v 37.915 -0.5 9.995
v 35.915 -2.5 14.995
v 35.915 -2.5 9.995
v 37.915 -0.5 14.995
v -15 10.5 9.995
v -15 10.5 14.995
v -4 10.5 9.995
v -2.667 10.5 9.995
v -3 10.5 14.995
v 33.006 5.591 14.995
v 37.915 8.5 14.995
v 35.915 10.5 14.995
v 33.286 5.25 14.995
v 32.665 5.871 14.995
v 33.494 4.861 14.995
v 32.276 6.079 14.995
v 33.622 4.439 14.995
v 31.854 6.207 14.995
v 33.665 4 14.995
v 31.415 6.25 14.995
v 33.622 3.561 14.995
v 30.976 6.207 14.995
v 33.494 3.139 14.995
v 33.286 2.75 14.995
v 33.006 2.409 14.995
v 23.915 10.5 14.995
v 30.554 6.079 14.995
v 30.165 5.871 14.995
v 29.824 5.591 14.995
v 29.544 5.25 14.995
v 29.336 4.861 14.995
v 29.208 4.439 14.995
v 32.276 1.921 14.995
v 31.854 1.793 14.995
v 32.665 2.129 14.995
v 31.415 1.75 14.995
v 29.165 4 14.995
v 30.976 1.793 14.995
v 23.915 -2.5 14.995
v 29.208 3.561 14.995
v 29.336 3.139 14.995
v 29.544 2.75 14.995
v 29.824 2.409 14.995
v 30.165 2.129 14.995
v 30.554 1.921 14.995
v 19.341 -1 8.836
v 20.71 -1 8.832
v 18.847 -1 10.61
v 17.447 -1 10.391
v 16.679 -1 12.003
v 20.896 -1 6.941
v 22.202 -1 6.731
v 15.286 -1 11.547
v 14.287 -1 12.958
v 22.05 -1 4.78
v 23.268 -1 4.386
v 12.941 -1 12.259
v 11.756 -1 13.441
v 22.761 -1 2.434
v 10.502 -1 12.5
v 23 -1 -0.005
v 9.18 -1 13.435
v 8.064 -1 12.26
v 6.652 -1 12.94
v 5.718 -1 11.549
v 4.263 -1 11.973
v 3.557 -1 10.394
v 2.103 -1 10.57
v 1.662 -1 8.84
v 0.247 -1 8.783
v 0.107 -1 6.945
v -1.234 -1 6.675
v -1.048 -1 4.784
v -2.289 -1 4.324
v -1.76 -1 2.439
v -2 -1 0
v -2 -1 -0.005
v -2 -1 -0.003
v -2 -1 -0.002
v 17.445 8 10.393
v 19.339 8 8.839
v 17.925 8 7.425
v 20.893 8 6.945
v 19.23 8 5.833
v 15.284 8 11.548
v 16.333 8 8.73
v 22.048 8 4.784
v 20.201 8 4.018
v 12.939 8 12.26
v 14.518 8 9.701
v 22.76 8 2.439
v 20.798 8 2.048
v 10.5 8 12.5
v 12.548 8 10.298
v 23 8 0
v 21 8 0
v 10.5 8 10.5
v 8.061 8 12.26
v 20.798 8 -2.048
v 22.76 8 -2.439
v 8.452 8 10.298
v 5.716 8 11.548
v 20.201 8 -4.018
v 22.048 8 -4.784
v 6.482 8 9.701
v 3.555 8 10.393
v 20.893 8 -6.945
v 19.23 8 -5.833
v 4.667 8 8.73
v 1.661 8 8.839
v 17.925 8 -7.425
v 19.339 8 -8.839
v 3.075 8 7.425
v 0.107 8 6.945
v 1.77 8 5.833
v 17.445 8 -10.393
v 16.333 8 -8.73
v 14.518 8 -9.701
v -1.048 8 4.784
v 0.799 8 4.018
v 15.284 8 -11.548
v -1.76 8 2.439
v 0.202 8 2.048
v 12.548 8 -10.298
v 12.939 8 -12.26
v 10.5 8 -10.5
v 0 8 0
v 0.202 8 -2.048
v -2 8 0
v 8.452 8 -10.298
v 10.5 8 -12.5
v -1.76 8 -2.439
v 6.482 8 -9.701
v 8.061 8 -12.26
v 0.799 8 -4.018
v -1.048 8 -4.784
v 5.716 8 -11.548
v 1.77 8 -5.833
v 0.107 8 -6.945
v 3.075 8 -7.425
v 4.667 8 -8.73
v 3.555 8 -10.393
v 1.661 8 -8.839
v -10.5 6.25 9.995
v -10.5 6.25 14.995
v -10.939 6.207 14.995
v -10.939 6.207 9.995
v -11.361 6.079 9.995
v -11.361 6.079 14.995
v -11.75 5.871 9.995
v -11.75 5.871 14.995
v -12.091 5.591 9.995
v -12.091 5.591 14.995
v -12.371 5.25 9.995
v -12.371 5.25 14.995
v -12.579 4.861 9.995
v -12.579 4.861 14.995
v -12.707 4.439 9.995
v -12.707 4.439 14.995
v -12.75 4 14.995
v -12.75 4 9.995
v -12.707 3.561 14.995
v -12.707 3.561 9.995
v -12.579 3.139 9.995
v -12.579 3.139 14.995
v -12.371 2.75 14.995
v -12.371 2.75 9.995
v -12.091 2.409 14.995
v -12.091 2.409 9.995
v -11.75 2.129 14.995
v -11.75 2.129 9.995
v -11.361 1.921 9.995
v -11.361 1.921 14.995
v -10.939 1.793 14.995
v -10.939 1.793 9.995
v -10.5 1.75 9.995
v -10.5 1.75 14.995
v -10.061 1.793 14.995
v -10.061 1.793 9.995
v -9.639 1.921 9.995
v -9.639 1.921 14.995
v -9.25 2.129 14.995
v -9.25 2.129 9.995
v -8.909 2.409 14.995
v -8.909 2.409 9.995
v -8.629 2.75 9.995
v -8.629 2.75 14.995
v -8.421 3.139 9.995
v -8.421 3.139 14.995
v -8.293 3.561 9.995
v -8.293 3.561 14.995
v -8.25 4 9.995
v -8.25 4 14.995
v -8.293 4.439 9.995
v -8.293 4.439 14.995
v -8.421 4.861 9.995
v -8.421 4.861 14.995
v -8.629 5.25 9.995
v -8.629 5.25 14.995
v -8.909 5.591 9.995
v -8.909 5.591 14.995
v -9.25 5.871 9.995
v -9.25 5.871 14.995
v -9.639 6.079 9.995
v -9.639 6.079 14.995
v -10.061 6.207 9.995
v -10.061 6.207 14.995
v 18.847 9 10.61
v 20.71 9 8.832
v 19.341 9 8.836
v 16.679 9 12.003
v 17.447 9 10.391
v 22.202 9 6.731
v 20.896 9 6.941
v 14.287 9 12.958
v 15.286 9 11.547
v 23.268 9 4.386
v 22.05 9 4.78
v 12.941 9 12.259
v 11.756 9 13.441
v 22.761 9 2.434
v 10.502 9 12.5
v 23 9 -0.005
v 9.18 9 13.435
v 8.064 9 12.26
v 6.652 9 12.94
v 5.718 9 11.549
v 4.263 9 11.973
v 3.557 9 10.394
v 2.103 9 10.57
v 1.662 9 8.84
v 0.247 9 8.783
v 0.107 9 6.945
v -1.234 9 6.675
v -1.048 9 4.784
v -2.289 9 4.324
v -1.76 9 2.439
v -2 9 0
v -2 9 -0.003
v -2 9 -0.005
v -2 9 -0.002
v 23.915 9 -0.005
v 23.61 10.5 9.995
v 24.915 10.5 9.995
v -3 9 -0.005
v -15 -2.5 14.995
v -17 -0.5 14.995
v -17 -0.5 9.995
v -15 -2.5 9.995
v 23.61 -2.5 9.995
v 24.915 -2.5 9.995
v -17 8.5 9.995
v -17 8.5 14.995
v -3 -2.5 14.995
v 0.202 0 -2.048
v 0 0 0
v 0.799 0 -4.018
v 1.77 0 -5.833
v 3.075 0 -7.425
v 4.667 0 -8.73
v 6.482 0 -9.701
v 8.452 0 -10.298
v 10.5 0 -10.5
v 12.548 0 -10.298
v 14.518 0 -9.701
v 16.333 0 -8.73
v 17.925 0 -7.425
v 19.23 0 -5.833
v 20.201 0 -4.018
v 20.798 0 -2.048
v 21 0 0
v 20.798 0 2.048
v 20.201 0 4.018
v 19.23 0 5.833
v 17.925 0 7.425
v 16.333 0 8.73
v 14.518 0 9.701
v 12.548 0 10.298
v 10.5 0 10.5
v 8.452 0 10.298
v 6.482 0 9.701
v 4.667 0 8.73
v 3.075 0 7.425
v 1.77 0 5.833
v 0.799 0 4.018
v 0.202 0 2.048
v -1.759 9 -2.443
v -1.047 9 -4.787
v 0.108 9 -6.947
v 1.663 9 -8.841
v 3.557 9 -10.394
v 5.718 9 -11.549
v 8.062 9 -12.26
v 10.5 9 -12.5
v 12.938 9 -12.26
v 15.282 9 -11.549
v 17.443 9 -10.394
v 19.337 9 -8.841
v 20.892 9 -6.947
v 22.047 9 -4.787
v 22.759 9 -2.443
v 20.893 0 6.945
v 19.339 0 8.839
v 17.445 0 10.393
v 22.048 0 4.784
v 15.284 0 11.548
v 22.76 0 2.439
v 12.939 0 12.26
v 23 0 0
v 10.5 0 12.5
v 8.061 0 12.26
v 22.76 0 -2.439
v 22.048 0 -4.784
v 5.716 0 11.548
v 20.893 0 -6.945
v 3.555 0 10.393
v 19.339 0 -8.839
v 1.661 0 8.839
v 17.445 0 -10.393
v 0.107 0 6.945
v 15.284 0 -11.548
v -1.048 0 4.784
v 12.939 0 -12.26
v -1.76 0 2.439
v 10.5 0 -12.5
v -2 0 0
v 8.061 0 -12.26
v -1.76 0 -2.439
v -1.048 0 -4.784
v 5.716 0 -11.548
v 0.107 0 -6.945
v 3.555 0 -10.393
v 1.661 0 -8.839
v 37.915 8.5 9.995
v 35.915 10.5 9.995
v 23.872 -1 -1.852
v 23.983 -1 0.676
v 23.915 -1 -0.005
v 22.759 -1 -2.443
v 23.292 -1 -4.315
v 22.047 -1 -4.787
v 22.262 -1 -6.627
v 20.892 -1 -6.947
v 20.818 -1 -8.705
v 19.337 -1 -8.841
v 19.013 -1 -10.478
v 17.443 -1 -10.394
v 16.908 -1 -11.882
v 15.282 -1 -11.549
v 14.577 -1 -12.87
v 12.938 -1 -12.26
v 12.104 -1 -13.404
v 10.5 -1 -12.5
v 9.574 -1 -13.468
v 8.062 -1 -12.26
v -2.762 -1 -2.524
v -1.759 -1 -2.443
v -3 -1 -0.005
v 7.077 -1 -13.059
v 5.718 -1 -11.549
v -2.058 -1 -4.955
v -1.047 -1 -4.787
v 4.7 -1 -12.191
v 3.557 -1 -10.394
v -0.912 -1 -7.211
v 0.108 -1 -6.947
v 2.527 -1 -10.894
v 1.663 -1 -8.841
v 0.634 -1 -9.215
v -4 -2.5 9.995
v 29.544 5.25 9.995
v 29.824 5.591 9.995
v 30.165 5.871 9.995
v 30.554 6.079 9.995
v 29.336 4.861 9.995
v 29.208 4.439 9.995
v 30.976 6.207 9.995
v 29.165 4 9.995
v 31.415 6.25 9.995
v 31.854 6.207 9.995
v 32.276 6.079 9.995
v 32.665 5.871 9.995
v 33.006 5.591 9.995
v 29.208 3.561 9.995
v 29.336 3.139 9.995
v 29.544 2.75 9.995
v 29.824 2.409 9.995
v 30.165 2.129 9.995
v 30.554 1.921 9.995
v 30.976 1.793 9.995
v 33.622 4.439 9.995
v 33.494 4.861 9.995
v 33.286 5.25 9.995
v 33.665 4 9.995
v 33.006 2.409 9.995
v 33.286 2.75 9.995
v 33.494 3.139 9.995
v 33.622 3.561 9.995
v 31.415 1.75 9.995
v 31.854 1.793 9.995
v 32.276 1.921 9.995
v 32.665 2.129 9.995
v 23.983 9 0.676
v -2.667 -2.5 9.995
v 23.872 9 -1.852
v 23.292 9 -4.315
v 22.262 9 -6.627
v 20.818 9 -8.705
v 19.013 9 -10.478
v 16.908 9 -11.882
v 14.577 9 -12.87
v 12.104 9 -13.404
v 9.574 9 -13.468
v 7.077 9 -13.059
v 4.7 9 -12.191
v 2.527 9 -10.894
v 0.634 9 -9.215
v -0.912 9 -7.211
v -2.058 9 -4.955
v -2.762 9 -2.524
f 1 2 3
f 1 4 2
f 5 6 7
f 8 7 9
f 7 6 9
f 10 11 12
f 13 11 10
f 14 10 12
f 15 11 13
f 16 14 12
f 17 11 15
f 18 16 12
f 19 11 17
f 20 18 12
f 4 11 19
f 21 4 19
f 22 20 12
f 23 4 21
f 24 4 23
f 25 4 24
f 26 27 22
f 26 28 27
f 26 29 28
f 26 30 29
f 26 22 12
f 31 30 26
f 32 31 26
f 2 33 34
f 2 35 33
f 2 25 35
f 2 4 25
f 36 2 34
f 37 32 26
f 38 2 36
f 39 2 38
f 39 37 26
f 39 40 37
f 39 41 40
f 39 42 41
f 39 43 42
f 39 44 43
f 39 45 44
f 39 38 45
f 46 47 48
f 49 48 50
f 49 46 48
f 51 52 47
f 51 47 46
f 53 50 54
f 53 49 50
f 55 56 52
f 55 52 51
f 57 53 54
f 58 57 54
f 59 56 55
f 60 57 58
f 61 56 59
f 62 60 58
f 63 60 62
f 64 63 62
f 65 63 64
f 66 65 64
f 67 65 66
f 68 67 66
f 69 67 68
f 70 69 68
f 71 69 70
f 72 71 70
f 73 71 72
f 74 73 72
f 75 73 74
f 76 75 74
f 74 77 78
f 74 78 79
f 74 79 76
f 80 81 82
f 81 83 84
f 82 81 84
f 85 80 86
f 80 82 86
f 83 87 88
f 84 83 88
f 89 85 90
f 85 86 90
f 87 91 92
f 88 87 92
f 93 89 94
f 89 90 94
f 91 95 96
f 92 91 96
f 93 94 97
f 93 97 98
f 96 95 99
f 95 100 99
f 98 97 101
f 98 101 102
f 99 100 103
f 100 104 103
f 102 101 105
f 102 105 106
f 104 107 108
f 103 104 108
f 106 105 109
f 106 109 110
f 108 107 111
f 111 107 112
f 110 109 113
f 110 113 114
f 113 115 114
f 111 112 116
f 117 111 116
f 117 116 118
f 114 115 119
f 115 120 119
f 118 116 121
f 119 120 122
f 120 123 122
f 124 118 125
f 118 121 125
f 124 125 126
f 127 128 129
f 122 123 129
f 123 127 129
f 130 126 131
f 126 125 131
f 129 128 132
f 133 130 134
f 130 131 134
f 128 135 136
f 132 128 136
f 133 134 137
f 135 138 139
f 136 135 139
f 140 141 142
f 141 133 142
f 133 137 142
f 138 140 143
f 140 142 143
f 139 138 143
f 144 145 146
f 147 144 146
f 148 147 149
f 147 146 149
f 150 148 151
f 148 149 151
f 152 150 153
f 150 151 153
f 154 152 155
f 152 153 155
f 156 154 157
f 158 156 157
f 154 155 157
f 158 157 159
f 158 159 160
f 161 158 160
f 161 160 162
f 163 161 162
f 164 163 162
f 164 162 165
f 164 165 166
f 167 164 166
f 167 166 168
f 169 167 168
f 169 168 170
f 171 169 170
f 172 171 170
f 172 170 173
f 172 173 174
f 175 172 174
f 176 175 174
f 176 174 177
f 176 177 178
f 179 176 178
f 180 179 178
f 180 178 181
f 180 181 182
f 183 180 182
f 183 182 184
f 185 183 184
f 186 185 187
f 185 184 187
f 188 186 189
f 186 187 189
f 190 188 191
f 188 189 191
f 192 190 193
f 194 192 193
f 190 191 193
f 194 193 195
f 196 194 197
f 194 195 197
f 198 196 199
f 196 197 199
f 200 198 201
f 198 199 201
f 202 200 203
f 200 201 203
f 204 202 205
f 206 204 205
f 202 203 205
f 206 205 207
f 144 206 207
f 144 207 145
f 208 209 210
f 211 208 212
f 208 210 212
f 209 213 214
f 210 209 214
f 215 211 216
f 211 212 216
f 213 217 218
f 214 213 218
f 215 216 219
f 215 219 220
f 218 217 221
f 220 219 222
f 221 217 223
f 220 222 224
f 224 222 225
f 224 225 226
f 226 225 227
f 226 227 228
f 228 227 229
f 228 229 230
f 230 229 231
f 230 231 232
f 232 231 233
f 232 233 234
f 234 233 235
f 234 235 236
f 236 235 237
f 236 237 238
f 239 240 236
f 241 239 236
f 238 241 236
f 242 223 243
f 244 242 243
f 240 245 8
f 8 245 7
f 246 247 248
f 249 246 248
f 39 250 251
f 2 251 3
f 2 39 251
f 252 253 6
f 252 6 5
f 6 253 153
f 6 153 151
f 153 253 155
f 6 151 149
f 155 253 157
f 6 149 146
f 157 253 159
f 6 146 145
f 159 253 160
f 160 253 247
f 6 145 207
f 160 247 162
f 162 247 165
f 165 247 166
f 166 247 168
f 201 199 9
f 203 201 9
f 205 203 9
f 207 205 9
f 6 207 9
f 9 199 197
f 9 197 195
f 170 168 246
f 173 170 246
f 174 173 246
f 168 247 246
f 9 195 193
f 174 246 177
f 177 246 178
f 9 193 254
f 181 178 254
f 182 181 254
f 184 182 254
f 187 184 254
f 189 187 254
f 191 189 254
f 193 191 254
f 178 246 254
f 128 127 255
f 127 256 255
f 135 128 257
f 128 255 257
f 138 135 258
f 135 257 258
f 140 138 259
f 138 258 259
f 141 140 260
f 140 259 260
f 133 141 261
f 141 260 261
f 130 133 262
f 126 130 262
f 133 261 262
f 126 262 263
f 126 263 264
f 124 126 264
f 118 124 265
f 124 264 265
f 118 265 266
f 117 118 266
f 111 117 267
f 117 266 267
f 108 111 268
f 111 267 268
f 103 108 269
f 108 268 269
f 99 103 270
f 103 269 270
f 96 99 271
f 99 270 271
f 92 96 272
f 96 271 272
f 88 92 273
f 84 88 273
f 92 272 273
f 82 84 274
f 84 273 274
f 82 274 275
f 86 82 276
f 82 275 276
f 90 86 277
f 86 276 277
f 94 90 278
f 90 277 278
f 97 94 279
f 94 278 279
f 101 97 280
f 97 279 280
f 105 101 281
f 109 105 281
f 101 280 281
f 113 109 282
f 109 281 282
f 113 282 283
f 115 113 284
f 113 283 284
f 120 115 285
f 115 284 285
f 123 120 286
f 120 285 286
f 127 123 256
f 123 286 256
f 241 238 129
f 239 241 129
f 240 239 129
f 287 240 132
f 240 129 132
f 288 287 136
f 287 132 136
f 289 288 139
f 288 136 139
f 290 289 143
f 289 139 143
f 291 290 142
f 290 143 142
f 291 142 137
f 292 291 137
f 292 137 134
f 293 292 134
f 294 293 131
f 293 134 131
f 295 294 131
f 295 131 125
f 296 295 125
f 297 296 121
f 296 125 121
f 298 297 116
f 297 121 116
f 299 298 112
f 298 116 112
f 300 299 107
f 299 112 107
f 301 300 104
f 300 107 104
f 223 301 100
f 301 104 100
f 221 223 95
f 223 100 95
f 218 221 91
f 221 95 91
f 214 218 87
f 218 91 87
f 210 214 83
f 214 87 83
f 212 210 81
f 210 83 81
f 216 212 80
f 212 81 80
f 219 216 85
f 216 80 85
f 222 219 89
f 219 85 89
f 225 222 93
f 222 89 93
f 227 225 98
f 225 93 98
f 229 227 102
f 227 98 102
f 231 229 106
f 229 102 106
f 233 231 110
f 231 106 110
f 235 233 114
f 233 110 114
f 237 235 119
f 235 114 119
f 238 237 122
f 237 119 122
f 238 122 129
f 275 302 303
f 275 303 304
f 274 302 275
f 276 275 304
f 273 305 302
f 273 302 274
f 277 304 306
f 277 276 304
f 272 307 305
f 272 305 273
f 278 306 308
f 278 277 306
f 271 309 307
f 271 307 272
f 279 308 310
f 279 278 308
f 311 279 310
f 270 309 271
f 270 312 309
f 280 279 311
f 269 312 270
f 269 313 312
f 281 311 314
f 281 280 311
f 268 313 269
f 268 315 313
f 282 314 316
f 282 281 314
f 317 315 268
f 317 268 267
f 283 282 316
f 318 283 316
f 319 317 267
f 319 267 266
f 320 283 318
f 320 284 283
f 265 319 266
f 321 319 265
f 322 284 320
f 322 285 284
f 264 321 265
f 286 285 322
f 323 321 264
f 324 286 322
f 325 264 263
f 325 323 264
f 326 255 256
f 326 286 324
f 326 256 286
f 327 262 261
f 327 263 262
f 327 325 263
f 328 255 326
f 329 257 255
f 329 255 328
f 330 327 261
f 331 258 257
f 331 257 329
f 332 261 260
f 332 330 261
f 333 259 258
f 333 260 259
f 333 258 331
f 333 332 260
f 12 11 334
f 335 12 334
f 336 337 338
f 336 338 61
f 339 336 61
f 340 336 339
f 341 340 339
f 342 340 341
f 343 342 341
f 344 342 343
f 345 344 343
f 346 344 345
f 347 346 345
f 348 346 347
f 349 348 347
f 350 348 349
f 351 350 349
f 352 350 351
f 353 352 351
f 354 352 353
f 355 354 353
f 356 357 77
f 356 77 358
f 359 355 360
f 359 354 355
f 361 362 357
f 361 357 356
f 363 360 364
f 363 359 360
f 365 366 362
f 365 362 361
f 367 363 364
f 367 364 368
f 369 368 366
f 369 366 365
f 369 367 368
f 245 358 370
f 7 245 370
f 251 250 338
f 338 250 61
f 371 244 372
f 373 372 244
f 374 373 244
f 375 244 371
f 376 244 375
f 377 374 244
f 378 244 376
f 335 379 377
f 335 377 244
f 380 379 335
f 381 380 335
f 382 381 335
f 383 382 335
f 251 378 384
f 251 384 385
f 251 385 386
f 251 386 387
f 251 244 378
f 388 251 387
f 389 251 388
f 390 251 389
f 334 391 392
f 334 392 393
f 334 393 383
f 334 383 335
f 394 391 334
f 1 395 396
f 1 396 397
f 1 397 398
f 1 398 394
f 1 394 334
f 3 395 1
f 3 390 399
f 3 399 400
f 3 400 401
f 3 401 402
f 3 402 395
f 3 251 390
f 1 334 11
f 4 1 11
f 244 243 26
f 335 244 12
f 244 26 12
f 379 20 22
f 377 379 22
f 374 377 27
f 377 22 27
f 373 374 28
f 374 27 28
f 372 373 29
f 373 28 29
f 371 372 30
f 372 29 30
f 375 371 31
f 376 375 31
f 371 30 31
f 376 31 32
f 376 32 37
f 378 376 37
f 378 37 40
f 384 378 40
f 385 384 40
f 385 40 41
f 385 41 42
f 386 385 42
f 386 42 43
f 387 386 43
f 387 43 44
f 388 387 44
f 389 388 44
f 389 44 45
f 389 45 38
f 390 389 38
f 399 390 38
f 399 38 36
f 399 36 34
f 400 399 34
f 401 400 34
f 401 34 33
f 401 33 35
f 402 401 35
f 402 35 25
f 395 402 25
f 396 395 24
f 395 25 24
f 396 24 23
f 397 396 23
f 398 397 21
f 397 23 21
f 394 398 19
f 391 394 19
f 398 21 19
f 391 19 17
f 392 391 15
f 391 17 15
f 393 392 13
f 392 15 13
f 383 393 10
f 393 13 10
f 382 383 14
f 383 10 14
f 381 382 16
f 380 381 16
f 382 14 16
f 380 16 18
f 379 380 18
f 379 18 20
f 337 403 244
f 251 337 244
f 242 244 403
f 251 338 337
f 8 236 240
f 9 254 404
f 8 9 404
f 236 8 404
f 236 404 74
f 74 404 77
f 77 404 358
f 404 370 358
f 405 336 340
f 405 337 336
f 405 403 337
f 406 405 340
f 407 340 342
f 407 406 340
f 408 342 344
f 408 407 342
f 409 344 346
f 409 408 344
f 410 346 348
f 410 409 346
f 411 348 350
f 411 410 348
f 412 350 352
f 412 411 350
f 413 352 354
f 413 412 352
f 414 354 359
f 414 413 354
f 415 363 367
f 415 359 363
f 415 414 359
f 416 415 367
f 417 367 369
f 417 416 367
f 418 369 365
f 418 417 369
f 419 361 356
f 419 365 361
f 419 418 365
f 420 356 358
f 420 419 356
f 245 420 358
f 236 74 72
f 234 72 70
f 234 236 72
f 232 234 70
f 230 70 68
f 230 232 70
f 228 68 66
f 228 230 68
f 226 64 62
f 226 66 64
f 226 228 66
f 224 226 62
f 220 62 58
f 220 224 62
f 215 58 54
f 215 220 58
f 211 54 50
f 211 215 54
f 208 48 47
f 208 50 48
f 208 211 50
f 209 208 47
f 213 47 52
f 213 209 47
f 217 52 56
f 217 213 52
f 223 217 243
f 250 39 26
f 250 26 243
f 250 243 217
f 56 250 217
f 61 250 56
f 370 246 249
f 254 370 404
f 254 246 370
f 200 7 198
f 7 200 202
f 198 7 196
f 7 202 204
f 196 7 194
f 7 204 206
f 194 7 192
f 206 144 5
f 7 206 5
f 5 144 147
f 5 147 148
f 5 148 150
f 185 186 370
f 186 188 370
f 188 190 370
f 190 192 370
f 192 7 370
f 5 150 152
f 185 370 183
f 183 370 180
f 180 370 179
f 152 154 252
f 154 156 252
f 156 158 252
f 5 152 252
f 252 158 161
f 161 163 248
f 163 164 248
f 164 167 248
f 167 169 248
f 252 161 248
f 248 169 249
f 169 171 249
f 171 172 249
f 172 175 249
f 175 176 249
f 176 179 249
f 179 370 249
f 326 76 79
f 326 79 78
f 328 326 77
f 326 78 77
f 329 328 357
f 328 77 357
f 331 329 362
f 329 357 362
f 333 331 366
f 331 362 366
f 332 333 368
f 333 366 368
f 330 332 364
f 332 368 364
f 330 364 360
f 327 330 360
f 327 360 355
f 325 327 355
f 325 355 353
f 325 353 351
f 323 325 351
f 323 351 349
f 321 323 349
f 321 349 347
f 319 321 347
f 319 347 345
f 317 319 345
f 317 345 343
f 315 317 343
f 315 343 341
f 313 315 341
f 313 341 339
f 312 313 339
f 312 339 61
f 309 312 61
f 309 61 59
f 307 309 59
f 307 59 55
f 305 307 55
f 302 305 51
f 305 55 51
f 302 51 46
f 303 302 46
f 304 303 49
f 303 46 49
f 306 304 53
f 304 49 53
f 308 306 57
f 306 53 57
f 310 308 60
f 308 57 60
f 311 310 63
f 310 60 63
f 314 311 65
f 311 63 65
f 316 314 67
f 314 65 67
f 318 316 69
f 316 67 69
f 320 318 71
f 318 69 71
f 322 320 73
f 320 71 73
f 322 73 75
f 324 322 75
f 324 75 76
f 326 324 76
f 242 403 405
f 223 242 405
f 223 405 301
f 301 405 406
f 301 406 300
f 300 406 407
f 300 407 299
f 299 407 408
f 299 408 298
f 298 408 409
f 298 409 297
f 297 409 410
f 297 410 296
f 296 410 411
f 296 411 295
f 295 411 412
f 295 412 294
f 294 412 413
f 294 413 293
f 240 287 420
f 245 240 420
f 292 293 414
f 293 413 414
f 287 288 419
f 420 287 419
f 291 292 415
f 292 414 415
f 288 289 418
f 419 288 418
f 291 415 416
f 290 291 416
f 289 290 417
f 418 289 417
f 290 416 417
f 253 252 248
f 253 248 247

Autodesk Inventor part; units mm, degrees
ref_plane "YZ Plane" through (0, 0, 0) normal (1, 0, 0) x (0, 1, 0)
ref_plane "XZ Plane" through (0, 0, 0) normal (0, 1, 0) x (-1, 0, 0)
ref_plane "XY Plane" through (0, 0, 0) normal (0, 0, 1) x (1, 0, 0)
sketch "Skizze1" plane through (0, 0, 0) normal (0, 0, 1) x (1, 0, 0)
  line L0 (0, 0) -> (-2, 0)
  line L1 (-2, 0) -> (-2, -1)
  line L2 (-2, -1) -> (-3, -1)
  line L3 (-3, -1) -> (-3, 9)
  line L4 (-3, 9) -> (-2, 9)
  line L5 (-2, 9) -> (-2, 8)
  line L6 (-2, 8) -> (0, 8)
  line L7 (0, 8) -> (0, 0)
  line L8 (10.5, 10.652115) -> (10.5, -3.008314) construction
  dimension "d0" = 3
  dimension "d1" = 10
  dimension "d2" = 8
  dimension "d3" = 1
  dimension "d4" = 2
  dimension "d5" = 10.5
sketch "Skizze1 outline for Umdrehung1" plane through (0, 0, 0) normal (0, 0, 1) x (1, 0, 0)
  line L0 (0, 0) -> (-2, 0)
  line L1 (-2, 0) -> (-2, -1)
  line L2 (-2, -1) -> (-3, -1)
  line L3 (-3, -1) -> (-3, 9)
  line L4 (-3, 9) -> (-2, 9)
  line L5 (-2, 9) -> (-2, 8)
  line L6 (-2, 8) -> (0, 8)
  line L7 (0, 8) -> (0, 0)
revolve "Umdrehung1" add sketch "Skizze1 outline for Umdrehung1" angle 360 about axis through (10.5, 10.652115, 0) along (0, -1, 0)
sketch "Skizze2" plane through (10.5, -1, 0) normal (0, -1, 0) x (1, 0, 0)
  circle A0 centre (0, 0) radius 13.5 construction
  line L0 (-13.499999, -0.004969) -> (1.488599, -0.004969) construction
  line L1 (-13.5, 14.995031) -> (-27.5, 14.995031)
  line L2 (-27.5, 14.995031) -> (-27.5, 9.995031)
  circle A1 centre (0, 0) radius 12.5 construction
  circle A2 centre (0, 0) radius 13.5
  circle A3 centre (0, 0) radius 12.5
  circle A4 centre (0, 0) radius 12.5
  line L3 (-27.5, 9.995031) -> (-14.5, 9.995031)
  line L4 (-14.5, 9.995031) -> (-13.499999, -0.004969)
  line L5 (-0.042524, -33.95519) -> (-0.042524, 19.973998) construction
  line L6 (13.414952, 14.995031) -> (27.414952, 14.995031)
  line L7 (27.414952, 14.995031) -> (27.414952, 9.995031)
  line L8 (12.499991, -0.004969) -> (13.414952, 14.995031)
  line L9 (27.414952, 9.995031) -> (14.414952, 9.995031)
  line L10 (14.414952, 9.995031) -> (13.414951, -0.004969)
  line L11 (-13.5, 14.995031) -> (-12.499999, -0.004969)
  circle A5 centre (0, 0) radius 12.5
  line L12 (-12.499999, -0.004969) -> (-13.499999, -0.004969)
  line L13 (13.414951, -0.004969) -> (12.499991, -0.004969)
  point P0 (-10.5, 0)
  point P1 (10.414952, 0)
  dimension "d9" = 15
  dimension "d11" = 5
  dimension "d12" = 13
  dimension "d13" = 14
  dimension "d14" = 27.5
sketch "Skizze2 outline for Extrusion1" plane through (10.5, -1, 0) normal (0, -1, 0) x (1, 0, 0)
  line L0 (12.499991, -0.004969) -> (13.414951, -0.004969)
  line L1 (13.414952, 14.995031) -> (12.499991, -0.004969)
  line L2 (27.414952, 14.995031) -> (13.414952, 14.995031)
  line L3 (27.414952, 9.995031) -> (27.414952, 14.995031)
  line L4 (14.414952, 9.995031) -> (27.414952, 9.995031)
  line L5 (13.414951, -0.004969) -> (14.414952, 9.995031)
  line L6 (-13.499999, -0.004969) -> (-14.5, 9.995031)
  line L7 (-14.5, 9.995031) -> (-27.5, 9.995031)
  line L8 (-27.5, 9.995031) -> (-27.5, 14.995031)
  line L9 (-27.5, 14.995031) -> (-13.5, 14.995031)
  line L10 (-13.5, 14.995031) -> (-12.499999, -0.004969)
  line L11 (-12.499999, -0.004969) -> (-13.499999, -0.004969)
extrude "Extrusion1" add sketch "Skizze2 outline for Extrusion1" against normal blind 11.5 and the other way blind 1.5
sketch "Skizze5" plane through (-17, -2.5, 14.995031) normal (-1, 0, 0) x (0, 0, 1)
  line L0 (-15, 13) -> (-15, 11.5) projected
  line L1 (-5, 13) -> (-5, 0) projected
  line L2 (-15, 11.5) -> (-5, 13)
  line L3 (-5, 13) -> (-15, 13)
  line L4 (-15, 13) -> (-15, 11.5)
  line L5 (-15, 1.5) -> (-15, 11.5) projected
  line L6 (-15, 1.5) -> (-5, 0)
  line L7 (0, 0) -> (-15, 0) projected
  line L8 (-15, 1.5) -> (-15, 0) projected
  line L9 (-15, 0) -> (-15, 1.5)
  line L10 (-15, 0) -> (-5, 0)
  point P0 (-14.995031, 2.5)
sketch "Skizze5 outline for Extrusion4" plane through (-17, -2.5, 14.995031) normal (-1, 0, 0) x (0, 0, 1)
  line L0 (-15, 13) -> (-15, 11.5)
  line L1 (-5, 13) -> (-15, 13)
  line L2 (-15, 11.5) -> (-5, 13)
  line L3 (-5, 0) -> (-15, 1.5)
  line L4 (-15, 0) -> (-5, 0)
  line L5 (-15, 1.5) -> (-15, 0)
extrude "Extrusion4" cut sketch "Skizze5 outline for Extrusion4" against normal through all
chamfer "Fase1" distance 2 angle 45 4 edges at (-17, -2.5, 12.495) (-17, 10.5, 12.495) (37.915, -2.5, 12.495) (37.915, 10.5, 12.495)
hole "Bohrung1" at (31.414952, 4, 9.995031) direction (0, 0, 1) diameter 4.5 end through all
hole "Bohrung2" at (-10.5, 4, 9.995031) direction (0, 0, 1) diameter 4.5 end through all
properties part number "lagerblock" material "Gusseisen, grau, ASTM A48 Klasse 20"
